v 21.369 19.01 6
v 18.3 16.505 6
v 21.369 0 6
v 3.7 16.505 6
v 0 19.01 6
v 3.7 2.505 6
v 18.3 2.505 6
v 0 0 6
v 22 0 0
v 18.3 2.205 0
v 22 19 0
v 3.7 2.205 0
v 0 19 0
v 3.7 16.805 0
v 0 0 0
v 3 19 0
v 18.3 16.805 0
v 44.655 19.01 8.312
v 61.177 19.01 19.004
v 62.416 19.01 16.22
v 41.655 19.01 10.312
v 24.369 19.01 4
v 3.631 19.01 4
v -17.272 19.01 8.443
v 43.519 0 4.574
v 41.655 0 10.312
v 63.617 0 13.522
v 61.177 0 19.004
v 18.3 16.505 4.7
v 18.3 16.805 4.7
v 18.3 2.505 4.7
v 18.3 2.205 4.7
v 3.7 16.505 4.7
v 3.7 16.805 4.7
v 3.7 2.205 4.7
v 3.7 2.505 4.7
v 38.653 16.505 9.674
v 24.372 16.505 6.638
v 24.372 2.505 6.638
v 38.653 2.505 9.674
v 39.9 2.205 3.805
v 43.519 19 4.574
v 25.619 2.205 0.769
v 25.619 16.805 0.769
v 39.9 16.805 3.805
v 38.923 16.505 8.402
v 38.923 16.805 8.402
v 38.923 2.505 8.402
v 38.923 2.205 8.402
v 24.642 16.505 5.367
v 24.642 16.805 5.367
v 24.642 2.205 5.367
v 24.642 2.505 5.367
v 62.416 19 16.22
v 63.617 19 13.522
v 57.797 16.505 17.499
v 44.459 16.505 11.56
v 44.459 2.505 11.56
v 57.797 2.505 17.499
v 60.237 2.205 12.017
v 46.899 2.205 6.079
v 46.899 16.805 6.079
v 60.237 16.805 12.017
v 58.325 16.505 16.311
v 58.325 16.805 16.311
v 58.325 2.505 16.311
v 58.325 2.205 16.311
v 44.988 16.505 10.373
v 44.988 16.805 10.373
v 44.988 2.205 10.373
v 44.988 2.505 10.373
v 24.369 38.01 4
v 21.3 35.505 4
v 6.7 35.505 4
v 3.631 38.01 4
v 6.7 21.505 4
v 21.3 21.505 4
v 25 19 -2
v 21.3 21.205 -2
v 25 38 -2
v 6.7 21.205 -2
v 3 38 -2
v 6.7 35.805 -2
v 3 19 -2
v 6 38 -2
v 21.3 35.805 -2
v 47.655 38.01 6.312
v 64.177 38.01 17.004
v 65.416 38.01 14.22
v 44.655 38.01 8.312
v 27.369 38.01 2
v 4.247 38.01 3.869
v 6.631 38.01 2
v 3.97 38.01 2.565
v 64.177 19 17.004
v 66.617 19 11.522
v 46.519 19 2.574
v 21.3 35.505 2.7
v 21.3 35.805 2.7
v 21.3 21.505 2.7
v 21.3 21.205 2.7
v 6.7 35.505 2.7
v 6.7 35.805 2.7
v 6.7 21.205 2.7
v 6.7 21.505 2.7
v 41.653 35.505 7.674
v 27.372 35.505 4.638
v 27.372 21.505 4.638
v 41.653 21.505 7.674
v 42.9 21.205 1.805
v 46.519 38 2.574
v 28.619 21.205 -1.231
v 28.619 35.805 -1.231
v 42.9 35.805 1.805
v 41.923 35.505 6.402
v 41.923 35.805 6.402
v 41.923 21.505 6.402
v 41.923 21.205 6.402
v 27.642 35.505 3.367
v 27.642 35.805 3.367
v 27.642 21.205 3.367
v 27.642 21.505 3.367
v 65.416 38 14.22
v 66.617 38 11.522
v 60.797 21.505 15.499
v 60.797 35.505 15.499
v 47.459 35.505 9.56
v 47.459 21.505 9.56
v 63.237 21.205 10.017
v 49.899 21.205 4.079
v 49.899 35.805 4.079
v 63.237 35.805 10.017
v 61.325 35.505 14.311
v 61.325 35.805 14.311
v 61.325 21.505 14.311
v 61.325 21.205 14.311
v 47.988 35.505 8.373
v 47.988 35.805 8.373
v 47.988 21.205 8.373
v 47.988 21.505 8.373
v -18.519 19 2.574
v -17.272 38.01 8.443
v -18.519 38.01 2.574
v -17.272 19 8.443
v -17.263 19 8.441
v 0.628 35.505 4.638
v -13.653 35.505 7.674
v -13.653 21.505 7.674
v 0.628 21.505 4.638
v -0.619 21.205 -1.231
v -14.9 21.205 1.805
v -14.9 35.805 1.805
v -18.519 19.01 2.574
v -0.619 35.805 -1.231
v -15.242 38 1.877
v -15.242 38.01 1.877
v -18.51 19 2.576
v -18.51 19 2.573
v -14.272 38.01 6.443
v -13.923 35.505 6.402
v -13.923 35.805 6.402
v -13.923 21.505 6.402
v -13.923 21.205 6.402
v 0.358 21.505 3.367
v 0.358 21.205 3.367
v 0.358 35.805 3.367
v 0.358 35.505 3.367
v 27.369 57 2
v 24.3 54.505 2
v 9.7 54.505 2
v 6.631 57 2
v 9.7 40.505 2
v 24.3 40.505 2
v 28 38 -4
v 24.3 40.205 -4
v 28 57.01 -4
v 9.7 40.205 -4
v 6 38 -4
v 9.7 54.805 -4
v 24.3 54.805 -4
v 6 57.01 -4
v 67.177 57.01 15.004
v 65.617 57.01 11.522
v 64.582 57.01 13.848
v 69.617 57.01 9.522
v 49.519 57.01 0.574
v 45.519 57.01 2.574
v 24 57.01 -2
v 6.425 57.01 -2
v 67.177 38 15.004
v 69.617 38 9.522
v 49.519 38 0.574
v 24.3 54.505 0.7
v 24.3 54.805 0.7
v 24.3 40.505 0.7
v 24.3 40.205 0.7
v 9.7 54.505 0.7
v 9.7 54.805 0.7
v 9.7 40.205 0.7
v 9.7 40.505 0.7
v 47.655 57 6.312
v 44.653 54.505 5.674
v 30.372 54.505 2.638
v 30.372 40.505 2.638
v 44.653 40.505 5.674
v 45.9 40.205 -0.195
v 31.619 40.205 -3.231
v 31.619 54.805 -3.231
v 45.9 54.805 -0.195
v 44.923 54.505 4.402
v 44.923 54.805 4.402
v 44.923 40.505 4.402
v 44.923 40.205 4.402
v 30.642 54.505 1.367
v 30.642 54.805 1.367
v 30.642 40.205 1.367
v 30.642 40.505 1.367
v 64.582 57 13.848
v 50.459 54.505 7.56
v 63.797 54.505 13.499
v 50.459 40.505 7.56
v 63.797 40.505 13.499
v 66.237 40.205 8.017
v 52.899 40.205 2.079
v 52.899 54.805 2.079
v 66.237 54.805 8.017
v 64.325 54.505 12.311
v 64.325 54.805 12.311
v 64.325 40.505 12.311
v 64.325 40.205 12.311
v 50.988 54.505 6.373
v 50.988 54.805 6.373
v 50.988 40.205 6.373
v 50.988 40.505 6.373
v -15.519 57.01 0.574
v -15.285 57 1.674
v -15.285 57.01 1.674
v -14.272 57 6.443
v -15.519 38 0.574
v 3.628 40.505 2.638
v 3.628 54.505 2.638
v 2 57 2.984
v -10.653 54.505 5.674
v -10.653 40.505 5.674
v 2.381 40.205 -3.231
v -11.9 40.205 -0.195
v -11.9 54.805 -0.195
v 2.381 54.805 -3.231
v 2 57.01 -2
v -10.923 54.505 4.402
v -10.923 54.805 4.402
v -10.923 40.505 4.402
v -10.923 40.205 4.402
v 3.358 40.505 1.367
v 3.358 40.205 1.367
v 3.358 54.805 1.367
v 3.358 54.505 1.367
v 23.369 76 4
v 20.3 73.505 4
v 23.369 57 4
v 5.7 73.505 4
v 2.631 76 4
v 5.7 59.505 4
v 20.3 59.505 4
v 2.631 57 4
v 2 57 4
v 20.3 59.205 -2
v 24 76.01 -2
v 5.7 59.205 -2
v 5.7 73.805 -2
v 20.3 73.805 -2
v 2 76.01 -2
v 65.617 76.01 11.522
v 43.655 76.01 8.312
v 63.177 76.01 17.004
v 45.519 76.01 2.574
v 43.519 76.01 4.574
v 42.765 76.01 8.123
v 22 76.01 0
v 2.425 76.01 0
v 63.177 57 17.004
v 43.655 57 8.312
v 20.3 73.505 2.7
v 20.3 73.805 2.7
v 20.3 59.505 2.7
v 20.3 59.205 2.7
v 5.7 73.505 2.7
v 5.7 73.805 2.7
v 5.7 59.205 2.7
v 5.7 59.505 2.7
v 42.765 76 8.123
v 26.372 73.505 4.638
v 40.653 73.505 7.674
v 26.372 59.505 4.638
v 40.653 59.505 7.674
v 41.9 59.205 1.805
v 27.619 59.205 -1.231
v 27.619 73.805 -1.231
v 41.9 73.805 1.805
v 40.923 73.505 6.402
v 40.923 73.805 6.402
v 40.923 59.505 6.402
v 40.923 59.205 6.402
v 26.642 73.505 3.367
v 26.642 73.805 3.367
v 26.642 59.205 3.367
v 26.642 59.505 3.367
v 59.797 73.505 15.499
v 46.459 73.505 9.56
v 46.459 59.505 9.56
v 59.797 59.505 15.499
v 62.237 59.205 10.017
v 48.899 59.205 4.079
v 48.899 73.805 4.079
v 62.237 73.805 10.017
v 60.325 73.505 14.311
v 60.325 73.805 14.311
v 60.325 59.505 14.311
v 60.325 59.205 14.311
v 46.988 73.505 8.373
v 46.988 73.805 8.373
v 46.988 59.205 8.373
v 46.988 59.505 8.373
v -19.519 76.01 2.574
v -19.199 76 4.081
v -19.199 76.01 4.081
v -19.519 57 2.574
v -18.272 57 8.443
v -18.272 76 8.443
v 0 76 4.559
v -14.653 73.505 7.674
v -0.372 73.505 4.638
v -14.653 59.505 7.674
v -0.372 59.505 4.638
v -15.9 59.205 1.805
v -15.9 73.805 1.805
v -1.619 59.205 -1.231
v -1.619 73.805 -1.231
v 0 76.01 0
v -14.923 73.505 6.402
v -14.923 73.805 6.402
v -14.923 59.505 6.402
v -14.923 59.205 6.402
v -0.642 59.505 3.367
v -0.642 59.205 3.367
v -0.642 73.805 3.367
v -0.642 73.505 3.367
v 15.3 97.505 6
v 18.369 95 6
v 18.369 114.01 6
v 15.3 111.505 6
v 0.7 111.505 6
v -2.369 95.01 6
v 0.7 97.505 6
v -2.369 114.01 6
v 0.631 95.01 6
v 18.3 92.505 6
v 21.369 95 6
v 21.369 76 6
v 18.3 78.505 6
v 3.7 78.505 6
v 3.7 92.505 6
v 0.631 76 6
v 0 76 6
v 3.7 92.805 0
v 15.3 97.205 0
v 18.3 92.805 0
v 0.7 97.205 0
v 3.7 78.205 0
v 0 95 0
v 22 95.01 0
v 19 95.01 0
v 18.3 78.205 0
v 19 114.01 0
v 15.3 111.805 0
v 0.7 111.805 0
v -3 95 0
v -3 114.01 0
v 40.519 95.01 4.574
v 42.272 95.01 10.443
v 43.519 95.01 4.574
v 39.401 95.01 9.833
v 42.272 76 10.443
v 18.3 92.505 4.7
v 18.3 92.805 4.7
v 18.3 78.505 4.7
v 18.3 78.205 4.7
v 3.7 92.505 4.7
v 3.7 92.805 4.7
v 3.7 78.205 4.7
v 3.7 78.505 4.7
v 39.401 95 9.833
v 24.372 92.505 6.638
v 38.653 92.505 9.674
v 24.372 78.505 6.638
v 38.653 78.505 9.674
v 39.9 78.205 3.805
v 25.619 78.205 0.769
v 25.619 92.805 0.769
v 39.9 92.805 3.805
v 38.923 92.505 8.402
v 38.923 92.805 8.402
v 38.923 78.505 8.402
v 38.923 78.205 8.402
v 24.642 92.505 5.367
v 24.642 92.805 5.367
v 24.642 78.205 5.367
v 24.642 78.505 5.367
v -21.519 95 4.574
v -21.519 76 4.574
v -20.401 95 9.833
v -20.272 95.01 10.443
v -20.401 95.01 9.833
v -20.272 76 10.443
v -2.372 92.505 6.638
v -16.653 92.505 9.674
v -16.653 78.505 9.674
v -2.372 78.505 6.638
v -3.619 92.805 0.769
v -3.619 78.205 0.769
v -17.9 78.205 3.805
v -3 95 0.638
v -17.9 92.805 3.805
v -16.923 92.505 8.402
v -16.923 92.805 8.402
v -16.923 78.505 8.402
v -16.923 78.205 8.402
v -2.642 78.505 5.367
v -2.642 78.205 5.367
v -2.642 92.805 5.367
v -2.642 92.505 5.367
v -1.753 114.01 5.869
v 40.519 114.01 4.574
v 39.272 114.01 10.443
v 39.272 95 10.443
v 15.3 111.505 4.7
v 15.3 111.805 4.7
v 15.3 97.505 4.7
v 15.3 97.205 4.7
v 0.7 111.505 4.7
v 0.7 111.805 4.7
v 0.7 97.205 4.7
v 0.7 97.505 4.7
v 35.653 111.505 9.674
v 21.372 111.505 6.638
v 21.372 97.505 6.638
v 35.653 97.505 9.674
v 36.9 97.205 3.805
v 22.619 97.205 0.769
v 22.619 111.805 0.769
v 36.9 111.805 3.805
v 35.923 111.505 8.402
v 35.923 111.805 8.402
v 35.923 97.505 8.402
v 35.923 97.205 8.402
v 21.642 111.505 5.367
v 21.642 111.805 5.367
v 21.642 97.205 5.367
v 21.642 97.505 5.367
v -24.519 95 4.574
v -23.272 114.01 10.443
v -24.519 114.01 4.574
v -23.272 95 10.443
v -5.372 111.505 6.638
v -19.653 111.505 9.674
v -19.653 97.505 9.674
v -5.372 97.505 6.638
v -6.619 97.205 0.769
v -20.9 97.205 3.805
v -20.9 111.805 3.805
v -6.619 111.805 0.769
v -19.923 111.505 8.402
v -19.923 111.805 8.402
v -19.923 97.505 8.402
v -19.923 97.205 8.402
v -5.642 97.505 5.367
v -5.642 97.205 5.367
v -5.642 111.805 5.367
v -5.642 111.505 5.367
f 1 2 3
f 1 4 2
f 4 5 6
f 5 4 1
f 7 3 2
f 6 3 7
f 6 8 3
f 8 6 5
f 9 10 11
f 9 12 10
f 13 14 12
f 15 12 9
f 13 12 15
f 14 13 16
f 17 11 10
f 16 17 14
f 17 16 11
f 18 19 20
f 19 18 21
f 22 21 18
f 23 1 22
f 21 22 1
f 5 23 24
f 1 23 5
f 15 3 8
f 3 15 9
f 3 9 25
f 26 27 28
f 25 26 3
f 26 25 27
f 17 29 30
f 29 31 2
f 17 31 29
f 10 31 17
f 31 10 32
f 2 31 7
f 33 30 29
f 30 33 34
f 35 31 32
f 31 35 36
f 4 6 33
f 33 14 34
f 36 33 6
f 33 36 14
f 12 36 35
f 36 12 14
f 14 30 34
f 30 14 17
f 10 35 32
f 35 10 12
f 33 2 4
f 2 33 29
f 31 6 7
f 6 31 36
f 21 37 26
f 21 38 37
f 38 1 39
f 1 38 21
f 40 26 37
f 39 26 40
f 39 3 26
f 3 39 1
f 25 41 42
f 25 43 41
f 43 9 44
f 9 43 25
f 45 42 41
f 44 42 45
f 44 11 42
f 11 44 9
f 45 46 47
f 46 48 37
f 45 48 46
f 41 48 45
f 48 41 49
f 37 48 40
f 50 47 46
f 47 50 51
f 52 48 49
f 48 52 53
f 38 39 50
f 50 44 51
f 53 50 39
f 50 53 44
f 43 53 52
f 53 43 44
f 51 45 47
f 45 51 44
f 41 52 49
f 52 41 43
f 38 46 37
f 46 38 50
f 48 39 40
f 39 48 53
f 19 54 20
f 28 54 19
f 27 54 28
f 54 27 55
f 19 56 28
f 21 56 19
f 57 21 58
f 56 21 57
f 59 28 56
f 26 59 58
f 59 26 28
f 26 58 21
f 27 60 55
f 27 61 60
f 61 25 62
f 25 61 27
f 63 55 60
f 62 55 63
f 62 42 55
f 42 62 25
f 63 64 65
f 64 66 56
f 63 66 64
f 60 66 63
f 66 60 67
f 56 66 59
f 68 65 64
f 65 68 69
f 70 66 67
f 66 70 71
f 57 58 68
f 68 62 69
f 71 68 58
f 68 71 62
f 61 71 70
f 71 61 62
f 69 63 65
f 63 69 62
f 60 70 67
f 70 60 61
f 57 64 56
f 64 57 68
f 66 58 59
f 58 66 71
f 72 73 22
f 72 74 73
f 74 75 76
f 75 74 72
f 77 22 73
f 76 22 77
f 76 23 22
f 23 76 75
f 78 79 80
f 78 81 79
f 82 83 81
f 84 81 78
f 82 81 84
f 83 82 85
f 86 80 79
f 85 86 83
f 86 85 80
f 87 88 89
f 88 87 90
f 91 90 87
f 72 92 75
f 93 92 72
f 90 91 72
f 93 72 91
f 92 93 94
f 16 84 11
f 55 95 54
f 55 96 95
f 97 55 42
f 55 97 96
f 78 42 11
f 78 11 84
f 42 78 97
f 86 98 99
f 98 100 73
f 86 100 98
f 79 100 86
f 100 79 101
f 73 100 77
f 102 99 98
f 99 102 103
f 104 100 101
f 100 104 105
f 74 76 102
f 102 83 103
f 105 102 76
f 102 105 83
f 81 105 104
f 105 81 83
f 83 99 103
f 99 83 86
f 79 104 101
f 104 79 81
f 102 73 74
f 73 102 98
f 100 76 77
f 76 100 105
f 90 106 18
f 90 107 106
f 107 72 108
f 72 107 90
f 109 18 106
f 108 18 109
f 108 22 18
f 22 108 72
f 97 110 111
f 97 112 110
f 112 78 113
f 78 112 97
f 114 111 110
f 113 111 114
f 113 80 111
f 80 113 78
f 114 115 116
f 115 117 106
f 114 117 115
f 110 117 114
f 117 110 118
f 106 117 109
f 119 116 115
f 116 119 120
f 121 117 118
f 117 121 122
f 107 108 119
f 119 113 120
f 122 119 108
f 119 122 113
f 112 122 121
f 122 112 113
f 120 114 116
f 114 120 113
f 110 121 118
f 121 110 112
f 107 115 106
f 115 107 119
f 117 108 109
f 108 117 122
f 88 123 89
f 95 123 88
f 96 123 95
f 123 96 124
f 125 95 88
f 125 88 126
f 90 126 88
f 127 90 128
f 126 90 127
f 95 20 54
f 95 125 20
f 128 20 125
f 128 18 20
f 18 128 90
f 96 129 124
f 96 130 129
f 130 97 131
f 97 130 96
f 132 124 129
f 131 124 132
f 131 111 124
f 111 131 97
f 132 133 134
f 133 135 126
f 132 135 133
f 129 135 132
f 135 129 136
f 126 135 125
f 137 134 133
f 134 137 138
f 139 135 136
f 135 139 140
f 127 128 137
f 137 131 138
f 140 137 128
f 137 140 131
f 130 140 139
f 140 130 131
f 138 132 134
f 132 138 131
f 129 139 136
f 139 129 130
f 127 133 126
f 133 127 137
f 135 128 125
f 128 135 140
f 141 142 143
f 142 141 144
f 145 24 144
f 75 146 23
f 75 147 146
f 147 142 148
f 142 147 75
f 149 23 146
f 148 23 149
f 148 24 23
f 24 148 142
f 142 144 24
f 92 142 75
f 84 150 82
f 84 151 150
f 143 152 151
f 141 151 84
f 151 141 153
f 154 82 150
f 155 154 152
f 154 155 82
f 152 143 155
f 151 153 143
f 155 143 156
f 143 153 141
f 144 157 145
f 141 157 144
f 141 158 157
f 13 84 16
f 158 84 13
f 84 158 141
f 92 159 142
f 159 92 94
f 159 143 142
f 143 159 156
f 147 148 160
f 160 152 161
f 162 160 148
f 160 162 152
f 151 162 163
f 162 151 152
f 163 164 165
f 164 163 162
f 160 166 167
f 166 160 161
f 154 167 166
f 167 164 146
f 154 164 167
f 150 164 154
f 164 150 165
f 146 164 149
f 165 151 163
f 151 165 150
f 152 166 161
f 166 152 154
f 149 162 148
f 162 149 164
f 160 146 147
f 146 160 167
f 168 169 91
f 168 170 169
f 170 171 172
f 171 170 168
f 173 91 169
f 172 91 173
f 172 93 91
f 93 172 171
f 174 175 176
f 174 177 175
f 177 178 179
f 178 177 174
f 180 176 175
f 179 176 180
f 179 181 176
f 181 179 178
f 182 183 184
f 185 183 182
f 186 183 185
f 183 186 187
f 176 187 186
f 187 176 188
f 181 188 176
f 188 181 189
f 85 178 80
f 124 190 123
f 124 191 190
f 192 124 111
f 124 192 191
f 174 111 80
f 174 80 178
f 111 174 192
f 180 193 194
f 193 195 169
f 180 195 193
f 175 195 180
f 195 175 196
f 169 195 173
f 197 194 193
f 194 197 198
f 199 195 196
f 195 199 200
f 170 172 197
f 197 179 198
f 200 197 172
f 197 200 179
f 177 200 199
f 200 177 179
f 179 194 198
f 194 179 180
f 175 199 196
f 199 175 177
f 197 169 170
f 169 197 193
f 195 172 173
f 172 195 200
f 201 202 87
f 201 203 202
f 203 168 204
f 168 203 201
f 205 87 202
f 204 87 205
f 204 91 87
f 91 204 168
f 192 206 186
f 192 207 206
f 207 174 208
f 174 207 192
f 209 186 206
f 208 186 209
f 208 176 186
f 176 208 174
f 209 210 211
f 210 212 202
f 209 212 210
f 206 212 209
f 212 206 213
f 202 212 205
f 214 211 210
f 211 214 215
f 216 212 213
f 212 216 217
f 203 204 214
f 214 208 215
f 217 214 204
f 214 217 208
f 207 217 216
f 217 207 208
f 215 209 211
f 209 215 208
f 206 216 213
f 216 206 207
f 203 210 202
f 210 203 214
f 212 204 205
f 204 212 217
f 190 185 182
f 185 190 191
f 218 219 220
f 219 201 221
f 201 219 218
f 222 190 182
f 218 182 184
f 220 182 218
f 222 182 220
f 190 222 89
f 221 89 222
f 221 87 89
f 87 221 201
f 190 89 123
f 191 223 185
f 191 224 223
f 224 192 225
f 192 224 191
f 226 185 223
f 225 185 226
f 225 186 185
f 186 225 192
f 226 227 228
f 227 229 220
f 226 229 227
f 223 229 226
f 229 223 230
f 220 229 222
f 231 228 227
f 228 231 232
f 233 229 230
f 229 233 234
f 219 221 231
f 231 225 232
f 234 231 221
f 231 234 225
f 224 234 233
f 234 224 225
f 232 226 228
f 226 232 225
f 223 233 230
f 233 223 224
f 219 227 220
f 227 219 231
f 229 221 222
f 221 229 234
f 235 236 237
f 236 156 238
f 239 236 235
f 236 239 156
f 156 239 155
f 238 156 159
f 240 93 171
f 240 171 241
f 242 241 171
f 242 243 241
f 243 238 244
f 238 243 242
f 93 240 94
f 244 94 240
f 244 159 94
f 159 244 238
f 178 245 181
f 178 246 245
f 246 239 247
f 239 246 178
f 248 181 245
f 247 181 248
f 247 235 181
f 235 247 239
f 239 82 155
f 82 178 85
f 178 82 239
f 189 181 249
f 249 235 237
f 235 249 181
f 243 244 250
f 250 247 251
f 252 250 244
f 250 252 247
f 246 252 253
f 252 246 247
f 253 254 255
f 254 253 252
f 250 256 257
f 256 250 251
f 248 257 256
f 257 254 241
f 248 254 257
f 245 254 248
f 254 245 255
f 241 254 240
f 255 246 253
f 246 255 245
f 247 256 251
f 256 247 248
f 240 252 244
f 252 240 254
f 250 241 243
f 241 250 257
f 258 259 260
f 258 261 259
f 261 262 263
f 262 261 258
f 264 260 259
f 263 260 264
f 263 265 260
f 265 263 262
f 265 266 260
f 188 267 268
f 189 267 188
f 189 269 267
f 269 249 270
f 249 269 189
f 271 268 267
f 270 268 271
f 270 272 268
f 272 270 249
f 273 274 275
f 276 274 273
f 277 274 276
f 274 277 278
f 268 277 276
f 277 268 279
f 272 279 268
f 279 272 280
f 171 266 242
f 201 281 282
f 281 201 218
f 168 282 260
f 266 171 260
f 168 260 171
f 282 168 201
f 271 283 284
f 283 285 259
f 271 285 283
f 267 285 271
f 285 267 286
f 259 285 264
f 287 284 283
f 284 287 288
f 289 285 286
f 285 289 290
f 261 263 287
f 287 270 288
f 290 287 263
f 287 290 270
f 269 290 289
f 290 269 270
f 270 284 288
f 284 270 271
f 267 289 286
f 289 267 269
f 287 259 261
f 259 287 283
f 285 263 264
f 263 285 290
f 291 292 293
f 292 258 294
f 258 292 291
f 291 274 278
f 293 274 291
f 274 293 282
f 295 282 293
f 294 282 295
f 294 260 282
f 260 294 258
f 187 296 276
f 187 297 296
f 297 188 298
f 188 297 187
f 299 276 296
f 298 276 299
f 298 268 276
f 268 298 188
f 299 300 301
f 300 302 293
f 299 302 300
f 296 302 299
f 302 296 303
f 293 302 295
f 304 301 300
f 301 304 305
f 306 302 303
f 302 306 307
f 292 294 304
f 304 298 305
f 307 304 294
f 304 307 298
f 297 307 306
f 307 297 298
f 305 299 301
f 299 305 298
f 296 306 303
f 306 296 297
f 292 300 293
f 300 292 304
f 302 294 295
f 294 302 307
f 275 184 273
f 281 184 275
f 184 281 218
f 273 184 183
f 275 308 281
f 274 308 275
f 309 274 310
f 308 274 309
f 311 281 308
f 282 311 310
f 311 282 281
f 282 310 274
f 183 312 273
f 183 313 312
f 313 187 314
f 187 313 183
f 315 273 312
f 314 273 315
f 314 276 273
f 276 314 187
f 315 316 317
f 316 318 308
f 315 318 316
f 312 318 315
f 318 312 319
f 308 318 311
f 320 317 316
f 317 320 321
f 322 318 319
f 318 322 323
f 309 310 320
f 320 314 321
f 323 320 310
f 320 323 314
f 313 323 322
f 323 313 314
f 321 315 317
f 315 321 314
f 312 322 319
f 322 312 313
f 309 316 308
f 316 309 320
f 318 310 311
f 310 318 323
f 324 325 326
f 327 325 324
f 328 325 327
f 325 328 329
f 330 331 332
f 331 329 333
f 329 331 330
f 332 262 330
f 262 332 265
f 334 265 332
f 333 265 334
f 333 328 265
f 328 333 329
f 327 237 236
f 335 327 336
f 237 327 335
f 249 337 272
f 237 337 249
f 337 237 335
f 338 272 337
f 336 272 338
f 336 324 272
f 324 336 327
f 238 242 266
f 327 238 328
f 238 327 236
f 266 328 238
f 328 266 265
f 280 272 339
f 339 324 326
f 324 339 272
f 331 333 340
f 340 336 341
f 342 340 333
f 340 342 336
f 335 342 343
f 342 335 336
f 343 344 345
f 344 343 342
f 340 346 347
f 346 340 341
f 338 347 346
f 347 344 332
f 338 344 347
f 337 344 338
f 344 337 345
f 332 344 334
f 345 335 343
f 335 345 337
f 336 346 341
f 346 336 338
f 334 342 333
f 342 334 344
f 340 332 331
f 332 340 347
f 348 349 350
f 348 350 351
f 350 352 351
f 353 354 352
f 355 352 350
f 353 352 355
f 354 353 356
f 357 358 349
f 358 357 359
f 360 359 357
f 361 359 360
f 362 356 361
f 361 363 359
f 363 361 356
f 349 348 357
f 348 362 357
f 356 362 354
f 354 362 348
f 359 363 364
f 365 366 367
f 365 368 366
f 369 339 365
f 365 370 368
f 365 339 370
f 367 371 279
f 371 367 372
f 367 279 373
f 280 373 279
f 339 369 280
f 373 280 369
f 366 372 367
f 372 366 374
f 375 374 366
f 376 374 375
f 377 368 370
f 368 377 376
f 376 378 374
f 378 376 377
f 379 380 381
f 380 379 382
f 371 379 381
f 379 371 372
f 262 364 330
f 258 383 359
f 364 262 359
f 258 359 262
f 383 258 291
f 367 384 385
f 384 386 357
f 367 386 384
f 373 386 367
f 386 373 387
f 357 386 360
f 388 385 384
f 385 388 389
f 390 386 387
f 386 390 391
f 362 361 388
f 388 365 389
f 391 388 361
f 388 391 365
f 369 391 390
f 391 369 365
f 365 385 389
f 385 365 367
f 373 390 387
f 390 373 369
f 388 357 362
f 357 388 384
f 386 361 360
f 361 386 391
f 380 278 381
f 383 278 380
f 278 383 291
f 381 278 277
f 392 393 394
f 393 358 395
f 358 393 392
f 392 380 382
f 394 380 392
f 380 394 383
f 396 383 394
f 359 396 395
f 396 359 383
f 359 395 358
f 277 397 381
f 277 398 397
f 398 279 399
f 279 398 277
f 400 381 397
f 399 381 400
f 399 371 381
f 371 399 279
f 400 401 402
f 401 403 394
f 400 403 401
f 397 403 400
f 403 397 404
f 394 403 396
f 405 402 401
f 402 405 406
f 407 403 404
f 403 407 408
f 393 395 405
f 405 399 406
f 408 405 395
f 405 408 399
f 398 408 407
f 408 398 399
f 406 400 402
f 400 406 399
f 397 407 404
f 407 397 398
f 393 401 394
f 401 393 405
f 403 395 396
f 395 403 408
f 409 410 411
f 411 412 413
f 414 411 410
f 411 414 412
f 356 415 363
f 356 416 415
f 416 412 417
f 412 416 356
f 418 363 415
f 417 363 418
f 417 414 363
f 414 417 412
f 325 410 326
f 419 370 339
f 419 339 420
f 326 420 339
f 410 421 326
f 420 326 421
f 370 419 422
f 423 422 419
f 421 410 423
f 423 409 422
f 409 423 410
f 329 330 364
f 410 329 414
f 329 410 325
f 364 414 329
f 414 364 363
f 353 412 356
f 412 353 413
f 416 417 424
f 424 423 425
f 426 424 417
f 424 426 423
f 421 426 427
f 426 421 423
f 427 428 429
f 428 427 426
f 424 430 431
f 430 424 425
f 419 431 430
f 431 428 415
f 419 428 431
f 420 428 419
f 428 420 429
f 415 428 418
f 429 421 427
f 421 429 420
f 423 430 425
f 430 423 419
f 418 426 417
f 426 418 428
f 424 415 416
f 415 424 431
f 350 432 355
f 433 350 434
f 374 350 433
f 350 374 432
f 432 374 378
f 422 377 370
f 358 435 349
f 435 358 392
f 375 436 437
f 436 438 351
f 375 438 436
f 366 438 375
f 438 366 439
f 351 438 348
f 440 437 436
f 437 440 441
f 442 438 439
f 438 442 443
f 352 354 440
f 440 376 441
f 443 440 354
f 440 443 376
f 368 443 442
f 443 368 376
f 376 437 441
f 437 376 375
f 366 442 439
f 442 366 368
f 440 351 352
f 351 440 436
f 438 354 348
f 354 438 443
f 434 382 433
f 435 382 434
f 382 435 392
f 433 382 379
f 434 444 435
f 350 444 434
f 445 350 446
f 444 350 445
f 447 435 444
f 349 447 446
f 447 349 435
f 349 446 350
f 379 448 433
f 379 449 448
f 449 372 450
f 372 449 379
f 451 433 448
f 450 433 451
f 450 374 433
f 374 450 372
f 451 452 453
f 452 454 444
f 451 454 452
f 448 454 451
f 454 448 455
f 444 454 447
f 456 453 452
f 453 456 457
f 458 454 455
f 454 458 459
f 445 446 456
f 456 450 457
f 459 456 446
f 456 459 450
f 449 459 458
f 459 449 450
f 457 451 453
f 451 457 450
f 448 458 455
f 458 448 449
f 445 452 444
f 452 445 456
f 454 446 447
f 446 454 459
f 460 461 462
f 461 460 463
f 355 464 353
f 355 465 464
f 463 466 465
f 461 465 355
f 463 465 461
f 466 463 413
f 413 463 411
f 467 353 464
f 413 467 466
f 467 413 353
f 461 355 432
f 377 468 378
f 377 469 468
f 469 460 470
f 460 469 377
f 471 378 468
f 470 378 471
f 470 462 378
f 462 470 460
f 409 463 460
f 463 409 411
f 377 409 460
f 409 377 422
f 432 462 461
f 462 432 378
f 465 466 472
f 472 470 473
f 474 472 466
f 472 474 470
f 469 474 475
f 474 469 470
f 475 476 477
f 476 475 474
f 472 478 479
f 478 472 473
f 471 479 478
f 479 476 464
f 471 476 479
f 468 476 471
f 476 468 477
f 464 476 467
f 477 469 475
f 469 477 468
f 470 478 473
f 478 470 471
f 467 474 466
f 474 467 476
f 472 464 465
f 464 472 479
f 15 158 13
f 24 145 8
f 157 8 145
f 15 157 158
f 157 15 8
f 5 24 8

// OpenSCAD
$top_t = 6;
$key_tilt = 12;
$key_col_size = 22;
$key_repeat = 19;
$key_row_size = $key_repeat+0.01;

module square() {
	$square = [$key_col_size, $key_row_size, $top_t];
	$hole_size = 14.6;
	$frange_hole_size = 14.0;
	$frange_thickness = 1.3;
	
	union() {
		difference() {
			cube($square);

			translate([($key_col_size - $hole_size) / 2, ($key_row_size - $hole_size) / 2, 0]) {
				cube([$hole_size, $hole_size, $top_t - $frange_thickness]);
			}
			translate([($key_col_size - $hole_size) / 2, ($key_row_size - $frange_hole_size) / 2, $top_t - $frange_thickness]) {
				cube([$hole_size, $frange_hole_size, $frange_thickness]);
			}
		}
	}
}

module rightColumn() {
	square();
	translate([$key_col_size, 0, 0]) {
		rotate([0, -$key_tilt, 0]) {
			square();
			translate([$key_col_size, 0, 0]) {
				rotate([0, -$key_tilt, 0]) {
					square();
				}
			}
		}
	}
}

module middleColumn() {
	square();
	translate([$key_col_size, 0, 0]) {
		rotate([0, -$key_tilt, 0]) {
			square();
			translate([$key_col_size, 0, 0]) {
				rotate([0, -$key_tilt, 0]) {
					square();
				}
			}
		}
	}
	translate([0, $key_row_size, 0]) {
		rotate([0, -$key_tilt, 180]) {
			square();
		}
	}
}

module leftColumn() {
	square();
	translate([$key_col_size, 0, 0]) {
		rotate([0, -$key_tilt, 0]) {
			square();
		}
	}
	translate([0, $key_row_size, 0]) {
		rotate([0, -$key_tilt, 180]) {
			square();
		}
	}
}

$key_offsets = [
	[0, 0],
	[3, -2],
	[6, -4],
	[2, -2],
	[0, 0],
	[-3, 0]
];

for (i = [0: 1: 5]) {
	translate([$key_offsets[i][0], $key_repeat * i, $key_offsets[i][1]]) {
		if (i == 0) {
			rightColumn();
		}
		else if (i < 4) {
			middleColumn();
		}
		else {
			leftColumn();
		}
	}
}

$anchorage_vertexies = [
	[0, 0, $top_t],
	[0, $key_row_size, $top_t],
	[
		$key_offsets[1][0] - $key_col_size * cos($key_tilt) + $top_t * sin($key_tilt),
		$key_row_size,
		$key_offsets[1][1] + $key_col_size * sin($key_tilt) + $top_t * cos($key_tilt)
	],
	[0, 0, 0],
	[0, $key_row_size, 0],
	[
		$key_offsets[1][0] - $key_col_size * cos($key_tilt),
		$key_row_size,
		$key_offsets[1][1] + $key_col_size * sin($key_tilt)
	],
];

polyhedron(
	points=$anchorage_vertexies,
	faces=[
		[3, 5, 4],
		[4, 1, 3],
		[1, 0, 3],
		[1, 4, 5, 2],
		[0, 2, 5],
		[0, 5, 3],
		[0, 1, 2],
	]
);
